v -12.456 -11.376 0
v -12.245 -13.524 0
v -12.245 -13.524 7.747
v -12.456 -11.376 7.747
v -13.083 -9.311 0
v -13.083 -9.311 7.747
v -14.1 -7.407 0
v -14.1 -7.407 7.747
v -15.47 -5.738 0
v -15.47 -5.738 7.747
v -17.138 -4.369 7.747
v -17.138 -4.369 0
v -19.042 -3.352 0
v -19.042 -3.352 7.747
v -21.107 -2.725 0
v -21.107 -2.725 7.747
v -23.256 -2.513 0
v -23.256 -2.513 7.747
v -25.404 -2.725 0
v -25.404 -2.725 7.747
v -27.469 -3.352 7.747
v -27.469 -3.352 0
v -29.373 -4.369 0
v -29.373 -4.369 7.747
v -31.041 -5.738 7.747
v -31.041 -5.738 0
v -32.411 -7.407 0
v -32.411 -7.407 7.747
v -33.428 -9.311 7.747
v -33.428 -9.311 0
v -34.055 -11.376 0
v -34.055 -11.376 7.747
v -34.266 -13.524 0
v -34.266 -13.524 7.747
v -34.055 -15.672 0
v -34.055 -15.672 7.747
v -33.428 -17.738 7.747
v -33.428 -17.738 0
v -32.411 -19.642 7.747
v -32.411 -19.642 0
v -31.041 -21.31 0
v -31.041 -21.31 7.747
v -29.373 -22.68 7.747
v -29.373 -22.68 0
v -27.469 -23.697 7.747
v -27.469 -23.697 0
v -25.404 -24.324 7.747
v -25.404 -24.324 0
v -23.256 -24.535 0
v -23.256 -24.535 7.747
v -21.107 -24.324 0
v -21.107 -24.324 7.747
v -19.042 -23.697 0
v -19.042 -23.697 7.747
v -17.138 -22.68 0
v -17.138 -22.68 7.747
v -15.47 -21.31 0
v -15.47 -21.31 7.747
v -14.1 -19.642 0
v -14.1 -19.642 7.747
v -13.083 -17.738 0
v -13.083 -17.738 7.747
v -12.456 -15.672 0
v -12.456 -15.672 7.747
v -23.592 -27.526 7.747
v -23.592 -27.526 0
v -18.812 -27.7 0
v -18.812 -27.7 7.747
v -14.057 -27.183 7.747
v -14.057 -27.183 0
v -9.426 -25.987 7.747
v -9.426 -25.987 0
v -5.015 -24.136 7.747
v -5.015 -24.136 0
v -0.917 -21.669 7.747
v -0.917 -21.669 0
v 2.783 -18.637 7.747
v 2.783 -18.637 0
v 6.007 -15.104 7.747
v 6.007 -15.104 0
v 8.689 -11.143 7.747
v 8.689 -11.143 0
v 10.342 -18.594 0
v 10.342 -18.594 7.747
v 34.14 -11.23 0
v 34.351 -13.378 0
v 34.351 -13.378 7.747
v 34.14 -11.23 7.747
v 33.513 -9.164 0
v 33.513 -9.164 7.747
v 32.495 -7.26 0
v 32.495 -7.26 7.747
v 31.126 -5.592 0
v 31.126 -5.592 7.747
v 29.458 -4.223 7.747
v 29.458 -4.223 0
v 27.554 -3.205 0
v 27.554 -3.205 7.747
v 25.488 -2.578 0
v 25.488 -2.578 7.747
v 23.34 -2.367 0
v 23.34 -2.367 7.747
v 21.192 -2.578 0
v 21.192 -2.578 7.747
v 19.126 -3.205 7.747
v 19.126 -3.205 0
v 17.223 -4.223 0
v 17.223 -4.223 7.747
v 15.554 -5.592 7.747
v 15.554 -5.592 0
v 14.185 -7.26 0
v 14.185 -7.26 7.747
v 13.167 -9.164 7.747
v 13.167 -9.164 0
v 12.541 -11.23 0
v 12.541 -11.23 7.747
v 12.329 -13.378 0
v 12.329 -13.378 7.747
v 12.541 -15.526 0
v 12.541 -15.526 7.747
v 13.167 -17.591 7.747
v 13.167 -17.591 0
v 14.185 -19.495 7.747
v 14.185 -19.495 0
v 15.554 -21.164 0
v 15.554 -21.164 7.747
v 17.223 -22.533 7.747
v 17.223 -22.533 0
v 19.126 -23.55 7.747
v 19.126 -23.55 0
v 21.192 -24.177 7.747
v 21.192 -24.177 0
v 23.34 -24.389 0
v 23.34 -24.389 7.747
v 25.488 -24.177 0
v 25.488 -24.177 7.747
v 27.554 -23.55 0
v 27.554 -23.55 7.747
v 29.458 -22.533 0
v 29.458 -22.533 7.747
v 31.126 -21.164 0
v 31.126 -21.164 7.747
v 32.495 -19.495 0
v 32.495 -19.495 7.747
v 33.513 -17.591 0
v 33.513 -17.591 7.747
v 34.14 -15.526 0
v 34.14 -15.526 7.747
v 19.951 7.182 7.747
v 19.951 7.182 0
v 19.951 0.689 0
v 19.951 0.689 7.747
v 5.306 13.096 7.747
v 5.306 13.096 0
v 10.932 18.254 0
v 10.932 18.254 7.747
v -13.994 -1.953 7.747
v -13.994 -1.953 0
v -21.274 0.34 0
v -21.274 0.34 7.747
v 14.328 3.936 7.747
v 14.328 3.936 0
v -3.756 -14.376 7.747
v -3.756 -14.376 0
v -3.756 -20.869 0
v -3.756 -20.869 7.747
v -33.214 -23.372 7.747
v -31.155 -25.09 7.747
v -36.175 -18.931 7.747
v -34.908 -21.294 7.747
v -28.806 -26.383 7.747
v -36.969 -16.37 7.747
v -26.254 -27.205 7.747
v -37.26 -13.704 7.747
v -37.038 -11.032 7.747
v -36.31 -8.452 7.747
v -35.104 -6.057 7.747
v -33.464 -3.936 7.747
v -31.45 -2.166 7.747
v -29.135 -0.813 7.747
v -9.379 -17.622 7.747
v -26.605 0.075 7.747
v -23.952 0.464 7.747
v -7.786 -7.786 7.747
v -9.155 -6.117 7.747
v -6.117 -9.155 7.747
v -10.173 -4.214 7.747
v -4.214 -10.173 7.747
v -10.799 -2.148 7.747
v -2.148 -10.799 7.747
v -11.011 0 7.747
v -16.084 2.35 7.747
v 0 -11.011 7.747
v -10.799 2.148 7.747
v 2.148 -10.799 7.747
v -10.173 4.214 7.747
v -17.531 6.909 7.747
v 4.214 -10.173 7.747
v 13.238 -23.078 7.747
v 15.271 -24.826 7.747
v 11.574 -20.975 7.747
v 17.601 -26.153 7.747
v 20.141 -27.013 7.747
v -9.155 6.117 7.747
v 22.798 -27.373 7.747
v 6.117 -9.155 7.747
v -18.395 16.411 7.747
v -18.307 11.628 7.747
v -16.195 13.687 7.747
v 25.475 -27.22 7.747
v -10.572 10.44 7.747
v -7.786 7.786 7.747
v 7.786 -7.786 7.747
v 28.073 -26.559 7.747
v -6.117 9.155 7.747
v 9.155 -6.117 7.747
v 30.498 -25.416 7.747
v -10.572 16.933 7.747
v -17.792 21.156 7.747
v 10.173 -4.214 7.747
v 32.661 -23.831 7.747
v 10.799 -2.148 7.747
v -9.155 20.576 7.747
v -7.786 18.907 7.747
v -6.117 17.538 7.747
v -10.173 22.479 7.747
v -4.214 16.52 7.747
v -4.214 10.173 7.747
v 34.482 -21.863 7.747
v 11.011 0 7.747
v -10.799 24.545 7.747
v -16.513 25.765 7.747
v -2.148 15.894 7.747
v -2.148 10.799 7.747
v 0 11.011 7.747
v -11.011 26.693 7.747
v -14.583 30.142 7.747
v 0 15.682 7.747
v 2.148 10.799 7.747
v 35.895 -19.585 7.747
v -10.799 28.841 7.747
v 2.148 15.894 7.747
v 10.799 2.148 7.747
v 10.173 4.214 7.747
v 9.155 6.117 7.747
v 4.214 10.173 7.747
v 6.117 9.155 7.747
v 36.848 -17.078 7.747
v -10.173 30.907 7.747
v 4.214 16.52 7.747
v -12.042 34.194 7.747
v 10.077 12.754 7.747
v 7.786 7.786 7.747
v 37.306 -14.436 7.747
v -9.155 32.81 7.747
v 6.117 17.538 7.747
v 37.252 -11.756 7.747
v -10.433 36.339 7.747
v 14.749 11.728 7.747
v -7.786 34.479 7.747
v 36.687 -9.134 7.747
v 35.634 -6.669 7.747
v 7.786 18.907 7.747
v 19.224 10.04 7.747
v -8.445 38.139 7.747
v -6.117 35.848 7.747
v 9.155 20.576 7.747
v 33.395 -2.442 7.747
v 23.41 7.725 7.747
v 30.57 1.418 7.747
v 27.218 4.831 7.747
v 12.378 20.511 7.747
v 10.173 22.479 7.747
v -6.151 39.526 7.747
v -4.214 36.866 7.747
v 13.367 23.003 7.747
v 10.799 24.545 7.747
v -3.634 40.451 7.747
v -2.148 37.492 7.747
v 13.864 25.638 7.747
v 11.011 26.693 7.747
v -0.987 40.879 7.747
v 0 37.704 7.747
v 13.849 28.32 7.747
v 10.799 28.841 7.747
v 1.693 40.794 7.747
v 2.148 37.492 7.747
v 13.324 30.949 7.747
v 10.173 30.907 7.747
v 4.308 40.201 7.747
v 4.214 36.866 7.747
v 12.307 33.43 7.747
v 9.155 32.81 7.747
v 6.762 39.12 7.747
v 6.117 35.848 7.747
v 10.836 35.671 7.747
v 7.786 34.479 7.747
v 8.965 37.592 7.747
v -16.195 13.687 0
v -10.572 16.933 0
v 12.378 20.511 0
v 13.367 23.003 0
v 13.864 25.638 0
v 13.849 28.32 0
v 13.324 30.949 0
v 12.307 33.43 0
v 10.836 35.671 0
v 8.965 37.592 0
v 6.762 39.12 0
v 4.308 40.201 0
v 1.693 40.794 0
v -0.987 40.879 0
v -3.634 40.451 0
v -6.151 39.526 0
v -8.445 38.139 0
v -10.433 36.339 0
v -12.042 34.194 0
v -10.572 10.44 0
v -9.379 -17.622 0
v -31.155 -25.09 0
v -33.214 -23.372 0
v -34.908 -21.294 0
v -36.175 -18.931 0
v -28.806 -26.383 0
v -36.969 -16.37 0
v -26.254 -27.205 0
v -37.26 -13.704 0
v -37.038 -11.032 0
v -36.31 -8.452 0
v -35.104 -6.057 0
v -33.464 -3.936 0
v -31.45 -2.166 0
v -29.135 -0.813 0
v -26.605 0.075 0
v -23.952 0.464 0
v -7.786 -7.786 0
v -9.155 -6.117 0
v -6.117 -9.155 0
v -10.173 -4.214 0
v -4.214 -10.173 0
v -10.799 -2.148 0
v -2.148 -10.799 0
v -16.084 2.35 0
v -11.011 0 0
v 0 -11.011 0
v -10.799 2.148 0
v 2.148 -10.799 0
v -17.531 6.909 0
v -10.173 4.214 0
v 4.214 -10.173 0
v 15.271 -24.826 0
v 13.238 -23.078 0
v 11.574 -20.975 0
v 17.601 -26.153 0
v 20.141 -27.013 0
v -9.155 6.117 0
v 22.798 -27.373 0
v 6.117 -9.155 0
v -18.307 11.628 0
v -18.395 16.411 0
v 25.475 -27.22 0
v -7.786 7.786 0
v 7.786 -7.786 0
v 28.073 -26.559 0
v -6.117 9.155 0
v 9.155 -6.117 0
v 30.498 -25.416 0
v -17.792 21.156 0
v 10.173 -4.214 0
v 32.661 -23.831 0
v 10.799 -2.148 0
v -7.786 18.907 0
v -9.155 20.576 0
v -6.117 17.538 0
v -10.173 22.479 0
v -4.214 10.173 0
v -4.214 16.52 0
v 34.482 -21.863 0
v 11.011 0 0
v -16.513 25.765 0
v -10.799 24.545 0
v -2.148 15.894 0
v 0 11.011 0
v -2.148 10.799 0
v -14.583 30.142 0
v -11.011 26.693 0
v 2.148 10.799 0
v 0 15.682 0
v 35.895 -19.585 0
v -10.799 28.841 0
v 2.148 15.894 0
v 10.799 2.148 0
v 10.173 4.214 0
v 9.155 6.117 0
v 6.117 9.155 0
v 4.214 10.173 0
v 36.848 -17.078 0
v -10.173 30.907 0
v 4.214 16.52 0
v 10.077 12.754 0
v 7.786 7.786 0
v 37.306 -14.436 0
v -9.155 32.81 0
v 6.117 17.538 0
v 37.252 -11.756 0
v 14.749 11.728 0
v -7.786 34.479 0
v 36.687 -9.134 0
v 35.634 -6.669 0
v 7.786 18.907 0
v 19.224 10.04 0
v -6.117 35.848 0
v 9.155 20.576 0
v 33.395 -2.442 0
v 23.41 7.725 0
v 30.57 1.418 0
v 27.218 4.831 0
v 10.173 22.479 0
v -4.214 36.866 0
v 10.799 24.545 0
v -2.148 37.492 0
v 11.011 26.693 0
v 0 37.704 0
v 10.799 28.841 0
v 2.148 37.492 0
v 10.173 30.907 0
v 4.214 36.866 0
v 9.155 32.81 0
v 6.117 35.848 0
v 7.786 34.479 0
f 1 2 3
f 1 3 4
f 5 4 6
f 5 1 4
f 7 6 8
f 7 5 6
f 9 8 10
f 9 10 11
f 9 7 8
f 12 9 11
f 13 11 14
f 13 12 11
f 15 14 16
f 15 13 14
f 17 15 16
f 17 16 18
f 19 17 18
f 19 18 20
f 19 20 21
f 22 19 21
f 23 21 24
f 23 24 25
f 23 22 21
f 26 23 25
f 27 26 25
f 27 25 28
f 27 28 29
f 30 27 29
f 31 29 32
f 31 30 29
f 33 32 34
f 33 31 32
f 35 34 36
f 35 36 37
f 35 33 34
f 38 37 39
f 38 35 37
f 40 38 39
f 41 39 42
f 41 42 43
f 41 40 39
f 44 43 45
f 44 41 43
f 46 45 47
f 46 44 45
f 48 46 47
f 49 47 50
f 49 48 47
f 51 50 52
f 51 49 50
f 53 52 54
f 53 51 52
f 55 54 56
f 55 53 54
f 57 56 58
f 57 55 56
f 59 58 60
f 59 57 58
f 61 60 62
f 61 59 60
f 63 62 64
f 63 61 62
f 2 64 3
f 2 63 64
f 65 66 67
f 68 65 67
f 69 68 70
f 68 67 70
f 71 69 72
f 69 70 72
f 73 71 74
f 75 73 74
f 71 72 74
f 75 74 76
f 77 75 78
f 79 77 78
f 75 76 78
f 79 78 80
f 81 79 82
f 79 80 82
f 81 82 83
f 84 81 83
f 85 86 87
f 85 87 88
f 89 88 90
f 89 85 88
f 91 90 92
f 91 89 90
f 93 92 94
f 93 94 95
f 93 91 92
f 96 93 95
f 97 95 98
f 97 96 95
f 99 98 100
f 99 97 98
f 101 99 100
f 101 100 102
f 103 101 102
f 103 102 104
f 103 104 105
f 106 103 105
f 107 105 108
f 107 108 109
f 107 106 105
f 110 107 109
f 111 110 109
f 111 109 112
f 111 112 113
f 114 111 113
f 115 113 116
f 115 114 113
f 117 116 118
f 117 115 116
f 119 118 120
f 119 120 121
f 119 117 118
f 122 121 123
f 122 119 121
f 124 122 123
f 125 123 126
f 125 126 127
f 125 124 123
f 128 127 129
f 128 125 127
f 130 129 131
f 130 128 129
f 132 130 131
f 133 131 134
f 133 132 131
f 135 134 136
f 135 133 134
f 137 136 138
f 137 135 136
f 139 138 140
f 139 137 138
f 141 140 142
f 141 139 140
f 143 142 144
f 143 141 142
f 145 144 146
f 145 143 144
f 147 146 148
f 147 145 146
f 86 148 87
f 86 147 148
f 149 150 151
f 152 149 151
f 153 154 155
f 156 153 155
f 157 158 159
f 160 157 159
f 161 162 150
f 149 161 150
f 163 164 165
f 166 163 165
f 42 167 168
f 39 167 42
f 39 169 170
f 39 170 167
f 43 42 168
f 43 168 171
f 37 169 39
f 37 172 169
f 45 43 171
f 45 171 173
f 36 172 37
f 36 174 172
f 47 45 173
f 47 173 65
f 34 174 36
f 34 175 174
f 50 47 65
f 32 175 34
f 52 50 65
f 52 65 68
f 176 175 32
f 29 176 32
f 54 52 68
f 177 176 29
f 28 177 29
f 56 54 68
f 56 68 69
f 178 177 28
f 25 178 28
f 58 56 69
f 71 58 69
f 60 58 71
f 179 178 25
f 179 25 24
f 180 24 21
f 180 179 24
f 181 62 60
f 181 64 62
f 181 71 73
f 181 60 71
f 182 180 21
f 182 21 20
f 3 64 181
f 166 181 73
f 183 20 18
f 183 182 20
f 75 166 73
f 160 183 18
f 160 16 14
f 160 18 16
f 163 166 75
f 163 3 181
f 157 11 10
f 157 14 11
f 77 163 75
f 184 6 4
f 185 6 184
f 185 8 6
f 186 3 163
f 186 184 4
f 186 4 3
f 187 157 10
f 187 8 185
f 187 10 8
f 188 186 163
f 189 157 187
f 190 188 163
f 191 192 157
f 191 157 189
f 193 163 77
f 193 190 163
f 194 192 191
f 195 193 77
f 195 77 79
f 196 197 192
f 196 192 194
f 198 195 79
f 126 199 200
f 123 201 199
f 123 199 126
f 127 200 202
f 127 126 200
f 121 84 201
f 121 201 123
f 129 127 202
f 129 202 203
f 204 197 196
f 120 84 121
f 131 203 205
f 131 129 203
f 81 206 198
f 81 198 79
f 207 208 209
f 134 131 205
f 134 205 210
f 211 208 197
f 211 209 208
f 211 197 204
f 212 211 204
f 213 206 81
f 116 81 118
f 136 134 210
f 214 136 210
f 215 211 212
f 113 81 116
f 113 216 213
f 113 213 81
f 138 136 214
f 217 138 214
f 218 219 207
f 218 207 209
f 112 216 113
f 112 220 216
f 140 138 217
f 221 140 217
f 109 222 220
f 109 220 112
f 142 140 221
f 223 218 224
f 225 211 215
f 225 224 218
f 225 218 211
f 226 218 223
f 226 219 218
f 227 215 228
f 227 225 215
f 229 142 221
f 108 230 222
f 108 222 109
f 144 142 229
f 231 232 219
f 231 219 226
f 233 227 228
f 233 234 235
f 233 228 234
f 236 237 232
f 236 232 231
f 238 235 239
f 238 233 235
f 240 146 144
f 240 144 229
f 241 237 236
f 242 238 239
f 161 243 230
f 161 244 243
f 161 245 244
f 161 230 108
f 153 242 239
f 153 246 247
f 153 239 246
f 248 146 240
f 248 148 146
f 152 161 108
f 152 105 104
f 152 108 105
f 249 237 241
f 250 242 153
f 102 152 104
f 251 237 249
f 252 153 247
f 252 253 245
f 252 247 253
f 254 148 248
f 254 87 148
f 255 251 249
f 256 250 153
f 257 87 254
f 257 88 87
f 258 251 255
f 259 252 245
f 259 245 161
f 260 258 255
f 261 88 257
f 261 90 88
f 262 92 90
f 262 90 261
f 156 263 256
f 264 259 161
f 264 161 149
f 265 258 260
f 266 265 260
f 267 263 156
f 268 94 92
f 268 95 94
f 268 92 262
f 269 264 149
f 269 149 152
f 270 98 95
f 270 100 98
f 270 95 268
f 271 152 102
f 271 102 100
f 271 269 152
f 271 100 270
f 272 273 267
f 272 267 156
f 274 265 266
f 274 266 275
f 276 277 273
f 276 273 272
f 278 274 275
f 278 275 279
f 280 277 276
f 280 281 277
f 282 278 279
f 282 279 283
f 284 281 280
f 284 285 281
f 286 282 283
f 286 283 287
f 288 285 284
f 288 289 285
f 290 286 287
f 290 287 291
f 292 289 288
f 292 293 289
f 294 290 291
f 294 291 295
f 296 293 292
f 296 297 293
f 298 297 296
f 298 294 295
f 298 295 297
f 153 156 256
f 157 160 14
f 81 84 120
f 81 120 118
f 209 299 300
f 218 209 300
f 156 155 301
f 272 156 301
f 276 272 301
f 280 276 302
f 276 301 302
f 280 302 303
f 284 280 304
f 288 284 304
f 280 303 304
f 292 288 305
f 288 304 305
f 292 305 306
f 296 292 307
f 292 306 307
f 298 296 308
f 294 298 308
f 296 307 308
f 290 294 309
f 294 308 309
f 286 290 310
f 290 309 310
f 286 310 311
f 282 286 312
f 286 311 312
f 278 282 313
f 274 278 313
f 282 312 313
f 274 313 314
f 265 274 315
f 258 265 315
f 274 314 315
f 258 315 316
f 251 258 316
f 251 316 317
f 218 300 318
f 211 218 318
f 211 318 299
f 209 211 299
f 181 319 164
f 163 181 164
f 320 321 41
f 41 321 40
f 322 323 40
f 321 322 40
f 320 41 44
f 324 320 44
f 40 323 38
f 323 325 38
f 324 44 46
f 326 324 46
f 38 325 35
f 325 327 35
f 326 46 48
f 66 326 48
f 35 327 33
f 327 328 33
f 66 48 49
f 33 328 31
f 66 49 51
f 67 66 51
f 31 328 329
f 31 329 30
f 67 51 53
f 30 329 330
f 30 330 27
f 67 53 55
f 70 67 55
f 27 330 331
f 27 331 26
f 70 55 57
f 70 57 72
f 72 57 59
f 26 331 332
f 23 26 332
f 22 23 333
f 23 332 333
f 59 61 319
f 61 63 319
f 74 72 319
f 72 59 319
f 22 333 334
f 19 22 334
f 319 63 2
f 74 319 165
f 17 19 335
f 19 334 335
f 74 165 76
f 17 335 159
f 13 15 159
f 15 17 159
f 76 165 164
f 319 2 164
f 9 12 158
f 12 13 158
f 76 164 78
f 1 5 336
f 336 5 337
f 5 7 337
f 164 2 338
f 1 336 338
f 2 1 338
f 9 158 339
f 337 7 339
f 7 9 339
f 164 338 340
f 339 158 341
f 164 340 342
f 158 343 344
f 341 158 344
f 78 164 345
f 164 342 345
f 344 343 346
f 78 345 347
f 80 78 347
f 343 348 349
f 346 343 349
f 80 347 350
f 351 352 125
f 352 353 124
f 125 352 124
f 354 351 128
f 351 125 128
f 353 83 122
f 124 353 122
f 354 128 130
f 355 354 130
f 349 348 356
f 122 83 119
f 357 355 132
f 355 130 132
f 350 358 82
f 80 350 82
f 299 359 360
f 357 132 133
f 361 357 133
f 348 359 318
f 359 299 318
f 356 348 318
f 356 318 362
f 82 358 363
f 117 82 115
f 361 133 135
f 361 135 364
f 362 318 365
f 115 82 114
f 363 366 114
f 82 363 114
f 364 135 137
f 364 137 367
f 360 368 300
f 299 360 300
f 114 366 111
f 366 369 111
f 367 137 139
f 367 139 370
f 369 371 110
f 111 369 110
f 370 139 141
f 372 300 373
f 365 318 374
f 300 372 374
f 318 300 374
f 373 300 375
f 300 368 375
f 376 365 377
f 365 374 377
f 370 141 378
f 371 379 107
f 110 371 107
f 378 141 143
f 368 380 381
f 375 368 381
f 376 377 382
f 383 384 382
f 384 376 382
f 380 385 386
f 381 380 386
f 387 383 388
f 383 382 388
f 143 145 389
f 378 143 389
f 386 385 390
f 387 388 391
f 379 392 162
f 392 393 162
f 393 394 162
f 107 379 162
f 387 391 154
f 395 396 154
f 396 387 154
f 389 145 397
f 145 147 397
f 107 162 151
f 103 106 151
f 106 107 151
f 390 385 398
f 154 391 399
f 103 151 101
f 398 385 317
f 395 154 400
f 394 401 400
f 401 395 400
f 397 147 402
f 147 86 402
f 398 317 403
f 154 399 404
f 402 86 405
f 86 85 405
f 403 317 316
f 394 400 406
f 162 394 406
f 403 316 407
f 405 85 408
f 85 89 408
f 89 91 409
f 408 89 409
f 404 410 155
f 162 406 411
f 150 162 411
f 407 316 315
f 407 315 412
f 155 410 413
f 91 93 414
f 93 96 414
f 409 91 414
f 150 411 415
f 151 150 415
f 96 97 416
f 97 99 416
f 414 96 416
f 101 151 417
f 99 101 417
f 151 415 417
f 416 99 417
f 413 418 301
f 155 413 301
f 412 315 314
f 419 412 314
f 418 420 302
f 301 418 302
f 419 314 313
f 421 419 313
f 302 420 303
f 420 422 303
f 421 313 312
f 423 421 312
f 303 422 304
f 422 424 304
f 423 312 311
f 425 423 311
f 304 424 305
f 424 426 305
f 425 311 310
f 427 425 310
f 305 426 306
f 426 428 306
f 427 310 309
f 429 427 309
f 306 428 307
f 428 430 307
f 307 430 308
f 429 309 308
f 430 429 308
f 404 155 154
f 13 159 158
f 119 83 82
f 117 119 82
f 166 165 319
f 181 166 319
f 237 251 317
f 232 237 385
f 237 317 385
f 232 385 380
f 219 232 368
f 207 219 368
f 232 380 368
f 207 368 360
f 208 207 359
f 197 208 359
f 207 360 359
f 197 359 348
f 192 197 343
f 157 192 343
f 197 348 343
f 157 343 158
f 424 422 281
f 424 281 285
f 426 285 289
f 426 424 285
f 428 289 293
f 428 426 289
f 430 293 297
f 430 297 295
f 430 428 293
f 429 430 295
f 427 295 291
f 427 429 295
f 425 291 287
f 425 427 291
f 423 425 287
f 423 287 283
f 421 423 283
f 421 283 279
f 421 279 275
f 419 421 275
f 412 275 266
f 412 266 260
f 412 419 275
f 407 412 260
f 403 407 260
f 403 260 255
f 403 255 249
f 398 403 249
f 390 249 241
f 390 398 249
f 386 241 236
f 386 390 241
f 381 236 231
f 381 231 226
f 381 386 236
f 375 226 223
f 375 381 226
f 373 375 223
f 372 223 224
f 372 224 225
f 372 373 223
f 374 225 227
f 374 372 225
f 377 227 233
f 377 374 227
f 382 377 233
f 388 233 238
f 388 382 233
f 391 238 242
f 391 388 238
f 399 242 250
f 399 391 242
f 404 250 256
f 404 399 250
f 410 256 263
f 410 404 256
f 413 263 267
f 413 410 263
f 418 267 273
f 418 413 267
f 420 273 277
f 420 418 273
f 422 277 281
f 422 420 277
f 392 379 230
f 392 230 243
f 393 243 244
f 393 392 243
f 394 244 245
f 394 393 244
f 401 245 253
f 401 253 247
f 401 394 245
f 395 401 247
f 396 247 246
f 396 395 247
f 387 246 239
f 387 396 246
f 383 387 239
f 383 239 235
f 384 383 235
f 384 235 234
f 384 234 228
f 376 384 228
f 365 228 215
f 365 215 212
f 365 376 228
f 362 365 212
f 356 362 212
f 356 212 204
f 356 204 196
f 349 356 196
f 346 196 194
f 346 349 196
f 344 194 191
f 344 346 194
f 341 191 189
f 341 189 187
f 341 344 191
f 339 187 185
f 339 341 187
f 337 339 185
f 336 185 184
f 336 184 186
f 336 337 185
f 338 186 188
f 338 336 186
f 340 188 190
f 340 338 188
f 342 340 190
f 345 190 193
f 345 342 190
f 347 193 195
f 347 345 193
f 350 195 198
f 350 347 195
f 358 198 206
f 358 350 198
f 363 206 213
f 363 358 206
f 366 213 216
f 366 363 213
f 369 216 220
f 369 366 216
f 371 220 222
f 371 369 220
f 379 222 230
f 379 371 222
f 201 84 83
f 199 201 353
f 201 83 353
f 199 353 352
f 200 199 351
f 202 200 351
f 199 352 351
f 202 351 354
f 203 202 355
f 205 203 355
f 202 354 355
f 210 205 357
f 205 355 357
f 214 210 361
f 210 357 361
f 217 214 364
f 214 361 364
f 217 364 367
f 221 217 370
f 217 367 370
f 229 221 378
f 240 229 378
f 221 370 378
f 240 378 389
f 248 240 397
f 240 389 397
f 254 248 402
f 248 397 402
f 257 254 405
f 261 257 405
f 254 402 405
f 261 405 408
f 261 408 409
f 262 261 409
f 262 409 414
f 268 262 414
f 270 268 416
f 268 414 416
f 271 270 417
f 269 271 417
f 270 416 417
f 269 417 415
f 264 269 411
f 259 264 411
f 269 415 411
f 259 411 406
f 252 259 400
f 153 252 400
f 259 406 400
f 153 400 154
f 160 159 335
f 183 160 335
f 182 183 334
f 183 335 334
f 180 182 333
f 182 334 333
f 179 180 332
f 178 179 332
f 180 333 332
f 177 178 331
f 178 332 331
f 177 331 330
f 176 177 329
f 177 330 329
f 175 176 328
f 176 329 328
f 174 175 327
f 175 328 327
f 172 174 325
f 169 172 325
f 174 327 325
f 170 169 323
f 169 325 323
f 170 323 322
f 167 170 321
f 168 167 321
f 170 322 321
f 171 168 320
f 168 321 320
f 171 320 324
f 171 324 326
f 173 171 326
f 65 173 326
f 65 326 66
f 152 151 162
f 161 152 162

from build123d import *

# Parameters (mm, degrees)
F0_R     = 11.0109
F1_DEPTH = 7.747


with BuildPart() as f1:
    # F0 (on Top) → F1 (new body)
    with BuildSketch(Plane.XY):
        with BuildLine():
            Line((5.30555, 13.096203), (10.931762, 18.253563))
            ThreePointArc((10.931762, 18.253563), (7.899724, 38.408908), (-12.041939, 34.194499))
            ThreePointArc((-12.041939, 34.194499), (-18.394659, 16.410973), (-13.994419, -1.953361))
            Line((-13.994419, -1.953361), (-21.27393, 0.340402))
            ThreePointArc((-21.27393, 0.340402), (-37.212952, -12.363092), (-23.592335, -27.525875))
            ThreePointArc((-23.592335, -27.525875), (-5.01499, -24.135728), (8.68887, -11.142842))
            Line((8.68887, -11.142842), (10.342168, -18.593965))
            ThreePointArc((10.342168, -18.593965), (29.313228, -26.045816), (35.634275, -6.668624))
            ThreePointArc((35.634275, -6.668624), (23.409649, 7.724756), (5.30555, 13.096203))
        make_face()
        with Locations((-23.255562, -13.524312)):
            Circle(F0_R, mode=Mode.SUBTRACT)
        Polygon((-3.755629, -14.376059), (-3.755629, -20.868891), (-9.378587, -17.622475), align=None, mode=Mode.SUBTRACT)
        Circle(F0_R, mode=Mode.SUBTRACT)
        with Locations((23.340179, -13.377751)):
            Circle(F0_R, mode=Mode.SUBTRACT)
        Polygon((14.327847, 3.935559), (19.950804, 7.181975), (19.950804, 0.689143), align=None, mode=Mode.SUBTRACT)
        Polygon((-16.195175, 13.686916), (-10.572217, 16.933332), (-10.572217, 10.4405), align=None, mode=Mode.SUBTRACT)
        with Locations((0, 26.692882)):
            Circle(F0_R, mode=Mode.SUBTRACT)
    extrude(amount=F1_DEPTH)


solid = f1.part
